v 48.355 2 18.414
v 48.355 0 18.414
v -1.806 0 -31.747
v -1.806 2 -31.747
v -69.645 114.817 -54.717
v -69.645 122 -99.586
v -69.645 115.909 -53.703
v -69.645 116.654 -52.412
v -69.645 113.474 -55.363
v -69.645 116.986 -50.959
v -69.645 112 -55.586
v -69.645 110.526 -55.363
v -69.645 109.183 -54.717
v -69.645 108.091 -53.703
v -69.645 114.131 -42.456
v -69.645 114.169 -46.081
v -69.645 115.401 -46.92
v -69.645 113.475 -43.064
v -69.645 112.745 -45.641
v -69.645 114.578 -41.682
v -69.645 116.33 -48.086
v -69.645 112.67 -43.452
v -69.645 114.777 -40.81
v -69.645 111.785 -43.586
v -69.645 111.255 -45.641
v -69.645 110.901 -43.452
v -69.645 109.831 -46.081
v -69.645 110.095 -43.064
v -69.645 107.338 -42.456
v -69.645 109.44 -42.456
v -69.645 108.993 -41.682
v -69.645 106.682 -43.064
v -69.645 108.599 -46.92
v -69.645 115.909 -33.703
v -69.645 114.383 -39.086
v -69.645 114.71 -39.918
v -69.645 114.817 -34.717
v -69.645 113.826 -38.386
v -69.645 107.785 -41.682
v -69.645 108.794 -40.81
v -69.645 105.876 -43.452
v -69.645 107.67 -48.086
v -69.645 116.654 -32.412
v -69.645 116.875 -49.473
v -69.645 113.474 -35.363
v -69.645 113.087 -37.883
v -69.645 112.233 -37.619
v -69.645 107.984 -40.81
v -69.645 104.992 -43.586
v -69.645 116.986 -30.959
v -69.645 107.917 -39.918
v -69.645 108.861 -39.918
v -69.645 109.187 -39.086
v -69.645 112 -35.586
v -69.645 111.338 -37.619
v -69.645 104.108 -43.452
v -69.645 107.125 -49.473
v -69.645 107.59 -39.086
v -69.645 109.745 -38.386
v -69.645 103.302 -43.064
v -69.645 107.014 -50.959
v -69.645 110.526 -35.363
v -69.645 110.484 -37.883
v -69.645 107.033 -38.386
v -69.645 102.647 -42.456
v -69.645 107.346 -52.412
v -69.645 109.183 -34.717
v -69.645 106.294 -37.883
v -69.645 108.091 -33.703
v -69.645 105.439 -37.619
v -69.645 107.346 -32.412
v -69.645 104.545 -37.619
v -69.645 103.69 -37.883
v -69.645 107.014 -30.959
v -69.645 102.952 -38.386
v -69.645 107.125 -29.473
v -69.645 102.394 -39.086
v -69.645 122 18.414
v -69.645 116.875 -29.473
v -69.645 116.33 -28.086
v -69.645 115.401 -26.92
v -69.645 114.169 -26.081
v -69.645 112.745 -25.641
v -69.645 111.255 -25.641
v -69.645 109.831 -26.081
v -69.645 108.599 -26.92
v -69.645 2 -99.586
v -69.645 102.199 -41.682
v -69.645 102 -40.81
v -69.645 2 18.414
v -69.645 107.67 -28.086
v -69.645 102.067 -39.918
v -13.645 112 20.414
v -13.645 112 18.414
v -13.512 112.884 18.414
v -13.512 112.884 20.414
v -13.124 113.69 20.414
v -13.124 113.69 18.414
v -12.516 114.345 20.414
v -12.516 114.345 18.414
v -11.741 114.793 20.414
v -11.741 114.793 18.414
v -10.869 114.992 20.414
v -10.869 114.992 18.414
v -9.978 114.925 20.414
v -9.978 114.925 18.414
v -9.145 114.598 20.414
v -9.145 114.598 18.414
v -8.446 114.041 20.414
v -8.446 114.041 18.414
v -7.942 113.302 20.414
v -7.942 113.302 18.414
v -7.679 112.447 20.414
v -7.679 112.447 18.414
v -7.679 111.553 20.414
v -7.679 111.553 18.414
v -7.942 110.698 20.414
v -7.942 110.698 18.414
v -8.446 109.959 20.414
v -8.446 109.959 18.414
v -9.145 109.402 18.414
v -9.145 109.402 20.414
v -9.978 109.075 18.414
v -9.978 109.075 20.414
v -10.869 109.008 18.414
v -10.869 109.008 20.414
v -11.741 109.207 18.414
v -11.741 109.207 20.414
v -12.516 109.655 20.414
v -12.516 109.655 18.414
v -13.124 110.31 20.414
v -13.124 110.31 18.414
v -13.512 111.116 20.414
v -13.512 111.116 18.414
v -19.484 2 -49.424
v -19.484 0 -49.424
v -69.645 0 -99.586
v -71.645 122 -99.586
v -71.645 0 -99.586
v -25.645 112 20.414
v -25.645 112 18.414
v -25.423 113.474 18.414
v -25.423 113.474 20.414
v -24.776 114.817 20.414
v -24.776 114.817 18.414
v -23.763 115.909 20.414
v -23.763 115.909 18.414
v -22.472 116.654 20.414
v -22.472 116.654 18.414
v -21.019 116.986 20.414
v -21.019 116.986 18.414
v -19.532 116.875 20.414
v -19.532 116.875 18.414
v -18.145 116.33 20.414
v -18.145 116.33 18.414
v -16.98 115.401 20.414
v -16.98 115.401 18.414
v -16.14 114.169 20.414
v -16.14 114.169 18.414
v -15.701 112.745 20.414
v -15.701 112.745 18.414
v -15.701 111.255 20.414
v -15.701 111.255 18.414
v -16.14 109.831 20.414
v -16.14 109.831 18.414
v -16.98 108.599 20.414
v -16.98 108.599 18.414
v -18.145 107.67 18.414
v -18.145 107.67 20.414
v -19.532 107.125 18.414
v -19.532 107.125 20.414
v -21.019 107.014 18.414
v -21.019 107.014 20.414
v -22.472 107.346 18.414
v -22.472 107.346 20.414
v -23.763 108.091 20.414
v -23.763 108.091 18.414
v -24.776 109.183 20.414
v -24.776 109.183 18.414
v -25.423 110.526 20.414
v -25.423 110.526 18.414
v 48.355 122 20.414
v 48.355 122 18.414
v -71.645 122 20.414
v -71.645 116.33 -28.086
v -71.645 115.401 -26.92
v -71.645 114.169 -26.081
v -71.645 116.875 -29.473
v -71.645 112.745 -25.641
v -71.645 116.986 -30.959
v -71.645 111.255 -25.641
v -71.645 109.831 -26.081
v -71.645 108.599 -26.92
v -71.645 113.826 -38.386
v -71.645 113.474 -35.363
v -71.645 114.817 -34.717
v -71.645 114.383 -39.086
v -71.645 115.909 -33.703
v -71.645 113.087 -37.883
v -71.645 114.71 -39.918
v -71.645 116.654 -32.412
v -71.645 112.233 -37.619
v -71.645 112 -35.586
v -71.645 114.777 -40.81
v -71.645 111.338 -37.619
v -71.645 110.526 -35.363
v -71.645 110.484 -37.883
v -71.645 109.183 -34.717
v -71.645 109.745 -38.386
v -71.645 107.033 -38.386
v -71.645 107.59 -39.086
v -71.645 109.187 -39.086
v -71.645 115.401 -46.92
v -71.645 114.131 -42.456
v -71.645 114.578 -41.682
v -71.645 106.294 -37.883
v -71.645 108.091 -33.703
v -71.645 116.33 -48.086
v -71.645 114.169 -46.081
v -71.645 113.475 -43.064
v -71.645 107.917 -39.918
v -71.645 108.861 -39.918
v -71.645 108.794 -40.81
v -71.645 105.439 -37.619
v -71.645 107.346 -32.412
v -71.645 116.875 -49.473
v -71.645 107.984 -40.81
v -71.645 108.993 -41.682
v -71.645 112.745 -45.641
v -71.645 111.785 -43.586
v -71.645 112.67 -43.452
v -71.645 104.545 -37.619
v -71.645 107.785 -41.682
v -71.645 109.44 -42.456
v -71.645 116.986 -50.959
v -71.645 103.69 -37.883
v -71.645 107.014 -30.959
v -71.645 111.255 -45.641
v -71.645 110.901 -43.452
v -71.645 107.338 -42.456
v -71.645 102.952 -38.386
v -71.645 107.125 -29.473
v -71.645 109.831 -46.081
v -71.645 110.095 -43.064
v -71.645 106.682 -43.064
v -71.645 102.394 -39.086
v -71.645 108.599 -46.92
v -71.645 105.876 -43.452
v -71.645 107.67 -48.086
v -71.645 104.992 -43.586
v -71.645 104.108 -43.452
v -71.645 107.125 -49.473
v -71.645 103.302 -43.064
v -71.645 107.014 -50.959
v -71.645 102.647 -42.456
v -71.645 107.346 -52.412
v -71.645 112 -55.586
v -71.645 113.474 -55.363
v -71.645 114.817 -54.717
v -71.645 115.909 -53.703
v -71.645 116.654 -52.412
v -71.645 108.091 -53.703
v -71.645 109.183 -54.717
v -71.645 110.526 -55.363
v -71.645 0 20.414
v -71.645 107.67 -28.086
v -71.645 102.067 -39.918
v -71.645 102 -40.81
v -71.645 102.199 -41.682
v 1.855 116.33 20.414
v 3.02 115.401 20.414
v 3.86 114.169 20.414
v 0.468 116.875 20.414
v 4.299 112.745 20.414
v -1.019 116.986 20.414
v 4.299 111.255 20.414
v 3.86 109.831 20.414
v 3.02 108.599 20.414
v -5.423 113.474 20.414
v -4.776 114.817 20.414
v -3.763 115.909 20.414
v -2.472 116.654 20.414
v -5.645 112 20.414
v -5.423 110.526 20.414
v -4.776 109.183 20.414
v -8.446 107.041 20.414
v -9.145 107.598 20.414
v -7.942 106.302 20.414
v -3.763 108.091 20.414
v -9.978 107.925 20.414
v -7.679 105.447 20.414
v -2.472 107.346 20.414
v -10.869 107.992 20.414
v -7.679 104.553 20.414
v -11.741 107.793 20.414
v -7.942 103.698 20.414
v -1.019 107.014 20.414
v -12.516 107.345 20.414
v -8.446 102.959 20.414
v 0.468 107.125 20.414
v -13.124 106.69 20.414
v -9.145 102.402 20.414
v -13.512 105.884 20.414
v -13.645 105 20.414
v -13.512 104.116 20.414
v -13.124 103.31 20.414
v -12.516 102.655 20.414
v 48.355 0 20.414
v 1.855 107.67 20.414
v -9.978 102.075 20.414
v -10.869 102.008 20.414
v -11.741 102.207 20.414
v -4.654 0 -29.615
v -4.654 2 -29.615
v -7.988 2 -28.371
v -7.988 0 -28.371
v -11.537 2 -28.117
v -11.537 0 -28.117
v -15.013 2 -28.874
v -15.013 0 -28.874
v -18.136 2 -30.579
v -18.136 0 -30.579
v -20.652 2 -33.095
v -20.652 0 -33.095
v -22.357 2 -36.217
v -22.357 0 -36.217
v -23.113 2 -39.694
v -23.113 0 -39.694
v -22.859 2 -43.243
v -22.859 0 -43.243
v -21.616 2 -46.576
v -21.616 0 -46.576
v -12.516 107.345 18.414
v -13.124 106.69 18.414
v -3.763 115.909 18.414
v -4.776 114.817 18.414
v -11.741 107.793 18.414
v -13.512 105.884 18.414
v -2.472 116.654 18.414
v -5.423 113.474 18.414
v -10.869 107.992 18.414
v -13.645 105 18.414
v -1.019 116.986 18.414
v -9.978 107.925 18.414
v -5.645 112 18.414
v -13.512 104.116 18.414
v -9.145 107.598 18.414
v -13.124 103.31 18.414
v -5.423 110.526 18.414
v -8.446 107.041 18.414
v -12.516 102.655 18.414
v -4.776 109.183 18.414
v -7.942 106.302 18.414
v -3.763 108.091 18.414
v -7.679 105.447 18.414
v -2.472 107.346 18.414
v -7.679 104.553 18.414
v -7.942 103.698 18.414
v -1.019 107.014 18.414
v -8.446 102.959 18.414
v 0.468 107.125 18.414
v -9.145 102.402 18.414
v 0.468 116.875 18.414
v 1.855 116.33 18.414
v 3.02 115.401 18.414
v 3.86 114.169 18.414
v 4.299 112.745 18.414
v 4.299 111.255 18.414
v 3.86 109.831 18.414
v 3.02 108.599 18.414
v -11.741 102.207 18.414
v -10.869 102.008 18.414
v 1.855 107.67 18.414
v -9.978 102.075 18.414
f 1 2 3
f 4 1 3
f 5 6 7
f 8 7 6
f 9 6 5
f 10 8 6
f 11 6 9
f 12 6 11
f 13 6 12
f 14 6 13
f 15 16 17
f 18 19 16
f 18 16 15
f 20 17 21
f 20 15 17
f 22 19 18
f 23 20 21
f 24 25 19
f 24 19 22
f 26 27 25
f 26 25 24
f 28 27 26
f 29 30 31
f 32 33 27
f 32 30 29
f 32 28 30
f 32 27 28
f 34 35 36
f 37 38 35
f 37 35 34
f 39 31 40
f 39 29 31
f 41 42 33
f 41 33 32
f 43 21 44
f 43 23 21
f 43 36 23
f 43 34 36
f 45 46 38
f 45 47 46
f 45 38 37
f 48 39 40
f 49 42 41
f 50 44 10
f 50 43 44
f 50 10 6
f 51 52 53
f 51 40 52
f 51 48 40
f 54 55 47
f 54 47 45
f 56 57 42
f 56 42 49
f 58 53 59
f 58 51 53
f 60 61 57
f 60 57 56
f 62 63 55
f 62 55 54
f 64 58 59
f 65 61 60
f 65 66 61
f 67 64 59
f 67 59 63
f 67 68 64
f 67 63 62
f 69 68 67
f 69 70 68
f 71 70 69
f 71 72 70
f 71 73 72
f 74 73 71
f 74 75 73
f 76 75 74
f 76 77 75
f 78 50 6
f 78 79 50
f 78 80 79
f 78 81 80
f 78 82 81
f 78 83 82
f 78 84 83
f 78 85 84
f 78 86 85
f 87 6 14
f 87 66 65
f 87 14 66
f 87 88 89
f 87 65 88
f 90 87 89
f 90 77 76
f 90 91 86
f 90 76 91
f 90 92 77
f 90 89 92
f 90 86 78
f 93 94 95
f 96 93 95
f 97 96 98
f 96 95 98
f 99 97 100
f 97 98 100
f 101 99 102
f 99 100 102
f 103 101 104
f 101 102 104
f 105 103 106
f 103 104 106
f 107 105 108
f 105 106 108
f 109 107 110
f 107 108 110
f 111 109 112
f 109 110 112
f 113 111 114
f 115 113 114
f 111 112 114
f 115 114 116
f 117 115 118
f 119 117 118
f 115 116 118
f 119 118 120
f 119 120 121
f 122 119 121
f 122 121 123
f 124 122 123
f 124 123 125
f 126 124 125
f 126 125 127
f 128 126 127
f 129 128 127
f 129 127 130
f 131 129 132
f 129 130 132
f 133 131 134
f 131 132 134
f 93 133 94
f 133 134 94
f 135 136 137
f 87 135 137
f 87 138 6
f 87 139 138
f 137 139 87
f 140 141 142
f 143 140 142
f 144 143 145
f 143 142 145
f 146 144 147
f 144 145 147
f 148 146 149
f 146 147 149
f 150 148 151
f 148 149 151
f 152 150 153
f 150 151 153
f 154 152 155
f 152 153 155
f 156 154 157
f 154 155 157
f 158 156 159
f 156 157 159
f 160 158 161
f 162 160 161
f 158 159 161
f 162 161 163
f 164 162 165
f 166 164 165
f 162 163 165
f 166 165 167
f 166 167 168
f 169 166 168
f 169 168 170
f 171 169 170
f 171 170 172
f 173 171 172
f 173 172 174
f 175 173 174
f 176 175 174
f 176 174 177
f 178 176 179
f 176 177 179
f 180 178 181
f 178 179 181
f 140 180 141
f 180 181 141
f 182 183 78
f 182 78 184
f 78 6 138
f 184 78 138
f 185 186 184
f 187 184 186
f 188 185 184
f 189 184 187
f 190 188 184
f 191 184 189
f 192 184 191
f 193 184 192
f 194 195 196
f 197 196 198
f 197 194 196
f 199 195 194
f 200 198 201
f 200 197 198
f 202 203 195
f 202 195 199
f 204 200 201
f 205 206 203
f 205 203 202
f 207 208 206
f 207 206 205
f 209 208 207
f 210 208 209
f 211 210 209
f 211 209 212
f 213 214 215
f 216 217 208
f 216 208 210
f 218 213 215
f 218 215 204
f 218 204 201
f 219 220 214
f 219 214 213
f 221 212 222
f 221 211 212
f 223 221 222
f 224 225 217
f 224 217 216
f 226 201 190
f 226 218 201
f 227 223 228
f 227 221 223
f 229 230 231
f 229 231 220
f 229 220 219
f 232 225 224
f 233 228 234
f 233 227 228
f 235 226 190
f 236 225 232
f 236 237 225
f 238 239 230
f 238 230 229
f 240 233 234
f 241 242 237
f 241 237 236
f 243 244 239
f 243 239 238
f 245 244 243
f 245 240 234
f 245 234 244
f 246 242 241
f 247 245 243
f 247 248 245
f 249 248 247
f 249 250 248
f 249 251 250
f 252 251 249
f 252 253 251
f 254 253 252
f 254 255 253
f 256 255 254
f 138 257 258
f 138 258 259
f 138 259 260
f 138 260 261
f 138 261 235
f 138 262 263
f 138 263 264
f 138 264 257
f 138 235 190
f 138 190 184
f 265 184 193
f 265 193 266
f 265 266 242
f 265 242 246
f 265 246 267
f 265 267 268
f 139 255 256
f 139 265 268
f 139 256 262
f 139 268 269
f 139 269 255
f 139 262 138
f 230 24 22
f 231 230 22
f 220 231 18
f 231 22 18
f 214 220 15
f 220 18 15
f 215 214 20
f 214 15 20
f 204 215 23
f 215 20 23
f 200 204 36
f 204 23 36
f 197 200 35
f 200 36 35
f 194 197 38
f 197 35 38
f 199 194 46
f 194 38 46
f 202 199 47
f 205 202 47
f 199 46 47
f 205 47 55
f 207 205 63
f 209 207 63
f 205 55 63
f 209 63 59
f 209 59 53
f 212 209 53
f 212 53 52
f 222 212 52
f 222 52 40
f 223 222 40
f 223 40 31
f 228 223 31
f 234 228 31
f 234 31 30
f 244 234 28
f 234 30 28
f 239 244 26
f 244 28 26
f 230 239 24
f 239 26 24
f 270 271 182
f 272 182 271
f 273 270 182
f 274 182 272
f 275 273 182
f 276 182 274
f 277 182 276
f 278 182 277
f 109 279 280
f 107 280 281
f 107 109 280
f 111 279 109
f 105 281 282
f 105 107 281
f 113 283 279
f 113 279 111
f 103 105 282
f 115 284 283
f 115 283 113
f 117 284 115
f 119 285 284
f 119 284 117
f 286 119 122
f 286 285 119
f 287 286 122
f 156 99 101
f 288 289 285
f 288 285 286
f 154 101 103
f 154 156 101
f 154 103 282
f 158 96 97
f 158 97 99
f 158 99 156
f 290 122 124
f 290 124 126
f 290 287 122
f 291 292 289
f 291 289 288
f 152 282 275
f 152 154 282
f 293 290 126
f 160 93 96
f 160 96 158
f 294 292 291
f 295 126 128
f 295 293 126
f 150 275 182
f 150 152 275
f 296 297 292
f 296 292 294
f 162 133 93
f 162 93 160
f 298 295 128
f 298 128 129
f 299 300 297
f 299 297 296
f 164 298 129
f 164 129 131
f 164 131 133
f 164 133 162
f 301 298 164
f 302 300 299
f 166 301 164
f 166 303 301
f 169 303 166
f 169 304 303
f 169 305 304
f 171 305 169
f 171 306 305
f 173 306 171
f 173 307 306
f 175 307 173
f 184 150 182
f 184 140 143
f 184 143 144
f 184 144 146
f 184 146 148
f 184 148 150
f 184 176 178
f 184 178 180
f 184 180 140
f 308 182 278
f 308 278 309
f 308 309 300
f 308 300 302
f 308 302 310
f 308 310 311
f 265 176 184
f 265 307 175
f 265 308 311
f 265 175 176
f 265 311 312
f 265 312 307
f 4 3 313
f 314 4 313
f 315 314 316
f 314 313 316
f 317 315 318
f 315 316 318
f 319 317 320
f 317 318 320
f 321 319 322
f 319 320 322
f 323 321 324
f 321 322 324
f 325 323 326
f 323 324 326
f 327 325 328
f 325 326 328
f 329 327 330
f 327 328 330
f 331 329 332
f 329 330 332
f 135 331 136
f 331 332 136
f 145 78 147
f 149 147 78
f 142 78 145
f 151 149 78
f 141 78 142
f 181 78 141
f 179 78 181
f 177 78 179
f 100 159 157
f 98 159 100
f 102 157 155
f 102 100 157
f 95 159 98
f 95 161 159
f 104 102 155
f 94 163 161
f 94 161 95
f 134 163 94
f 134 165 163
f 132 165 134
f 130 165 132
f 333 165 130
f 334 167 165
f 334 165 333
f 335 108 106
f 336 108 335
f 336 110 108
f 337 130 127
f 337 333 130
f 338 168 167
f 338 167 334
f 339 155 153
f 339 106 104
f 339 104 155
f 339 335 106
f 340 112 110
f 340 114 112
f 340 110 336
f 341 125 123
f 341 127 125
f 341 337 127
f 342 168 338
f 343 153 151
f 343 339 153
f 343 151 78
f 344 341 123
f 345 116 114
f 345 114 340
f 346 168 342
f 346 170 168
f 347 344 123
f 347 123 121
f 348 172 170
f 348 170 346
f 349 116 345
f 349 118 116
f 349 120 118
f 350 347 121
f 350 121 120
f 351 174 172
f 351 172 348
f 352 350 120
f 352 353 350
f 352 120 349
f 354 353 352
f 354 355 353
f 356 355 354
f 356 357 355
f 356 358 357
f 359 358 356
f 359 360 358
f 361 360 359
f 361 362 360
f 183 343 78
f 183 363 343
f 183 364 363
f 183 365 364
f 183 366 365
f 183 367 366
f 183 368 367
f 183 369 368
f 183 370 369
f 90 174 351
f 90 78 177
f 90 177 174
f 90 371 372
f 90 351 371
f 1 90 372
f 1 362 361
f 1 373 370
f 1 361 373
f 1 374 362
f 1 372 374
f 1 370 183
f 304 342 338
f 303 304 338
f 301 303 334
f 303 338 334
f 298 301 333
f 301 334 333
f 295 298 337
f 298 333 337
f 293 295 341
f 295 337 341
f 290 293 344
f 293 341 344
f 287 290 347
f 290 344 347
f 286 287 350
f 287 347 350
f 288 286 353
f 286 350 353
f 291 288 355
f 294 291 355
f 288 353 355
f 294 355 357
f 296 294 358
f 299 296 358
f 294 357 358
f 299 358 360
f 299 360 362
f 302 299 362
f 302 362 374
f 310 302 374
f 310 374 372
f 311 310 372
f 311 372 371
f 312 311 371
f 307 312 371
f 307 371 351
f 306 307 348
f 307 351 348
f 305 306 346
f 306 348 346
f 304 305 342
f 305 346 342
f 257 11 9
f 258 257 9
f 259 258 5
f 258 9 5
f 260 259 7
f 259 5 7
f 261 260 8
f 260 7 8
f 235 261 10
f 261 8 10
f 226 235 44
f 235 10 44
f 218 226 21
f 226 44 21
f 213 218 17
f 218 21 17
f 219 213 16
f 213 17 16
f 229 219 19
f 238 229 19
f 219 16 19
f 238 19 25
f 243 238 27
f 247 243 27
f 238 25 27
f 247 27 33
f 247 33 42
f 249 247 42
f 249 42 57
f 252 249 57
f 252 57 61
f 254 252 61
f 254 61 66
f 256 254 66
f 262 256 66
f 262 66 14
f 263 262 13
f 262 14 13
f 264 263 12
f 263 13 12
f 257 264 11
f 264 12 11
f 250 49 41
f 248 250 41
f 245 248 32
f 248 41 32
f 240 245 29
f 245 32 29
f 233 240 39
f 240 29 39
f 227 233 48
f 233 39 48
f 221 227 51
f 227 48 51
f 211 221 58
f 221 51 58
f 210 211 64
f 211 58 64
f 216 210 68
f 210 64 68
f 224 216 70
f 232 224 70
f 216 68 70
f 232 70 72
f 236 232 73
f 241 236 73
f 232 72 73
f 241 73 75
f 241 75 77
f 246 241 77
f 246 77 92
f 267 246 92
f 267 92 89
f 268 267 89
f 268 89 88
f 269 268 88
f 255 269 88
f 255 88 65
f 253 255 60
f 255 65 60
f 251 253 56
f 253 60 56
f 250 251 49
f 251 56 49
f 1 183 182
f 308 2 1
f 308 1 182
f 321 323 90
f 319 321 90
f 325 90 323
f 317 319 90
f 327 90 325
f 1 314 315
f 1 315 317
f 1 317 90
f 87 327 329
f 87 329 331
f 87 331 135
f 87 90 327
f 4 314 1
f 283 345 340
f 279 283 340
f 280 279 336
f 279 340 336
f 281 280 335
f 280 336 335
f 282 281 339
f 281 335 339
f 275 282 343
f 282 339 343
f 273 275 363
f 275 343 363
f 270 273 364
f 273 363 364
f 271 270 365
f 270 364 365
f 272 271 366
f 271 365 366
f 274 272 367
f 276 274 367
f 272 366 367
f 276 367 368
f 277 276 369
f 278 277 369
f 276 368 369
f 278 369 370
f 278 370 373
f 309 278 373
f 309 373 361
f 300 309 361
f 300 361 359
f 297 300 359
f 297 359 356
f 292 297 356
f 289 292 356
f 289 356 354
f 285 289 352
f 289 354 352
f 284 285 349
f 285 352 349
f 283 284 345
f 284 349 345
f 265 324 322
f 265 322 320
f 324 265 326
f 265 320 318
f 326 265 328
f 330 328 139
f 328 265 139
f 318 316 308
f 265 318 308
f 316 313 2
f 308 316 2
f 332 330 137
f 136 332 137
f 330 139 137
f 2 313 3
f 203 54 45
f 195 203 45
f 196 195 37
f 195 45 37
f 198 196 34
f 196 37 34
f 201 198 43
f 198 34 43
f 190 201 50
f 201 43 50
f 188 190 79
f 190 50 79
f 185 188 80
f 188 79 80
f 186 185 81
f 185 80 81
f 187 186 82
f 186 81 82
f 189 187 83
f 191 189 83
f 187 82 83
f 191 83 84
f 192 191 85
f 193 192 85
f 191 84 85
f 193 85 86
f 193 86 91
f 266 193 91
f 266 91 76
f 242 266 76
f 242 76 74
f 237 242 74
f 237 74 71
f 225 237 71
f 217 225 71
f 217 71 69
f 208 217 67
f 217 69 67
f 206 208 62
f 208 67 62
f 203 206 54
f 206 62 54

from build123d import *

# Parameters (mm, degrees)
EXTRUDE_1_DEPTH     = 2
EXTRUDE_2_DEPTH     = 120
SKETCH_3_R          = 5
SKETCH_3_R_2        = 3
CUT_EXTRUDE_1_DEPTH = 2
SKETCH_4_R          = 5
SKETCH_4_R_2        = 3
CUT_EXTRUDE_2_DEPTH = 2
SKETCH_5_R          = 3
CUT_EXTRUDE_3_DEPTH = 2


with BuildPart() as part:
    # 草图1 → 凸台-拉伸1 (new body)
    with BuildSketch(Plane(origin=(0, 0, 0), x_dir=(1, 0, 0), z_dir=(0, 1, 0))):
        with BuildLine():
            Line((-71.645096328, 99.585522078), (-71.645096328, -20.414477922))
            Line((-71.645096328, -20.414477922), (48.354903672, -20.414477922))
            Line((48.354903672, -20.414477922), (48.354903672, -18.414477922))
            Line((48.354903672, -18.414477922), (-1.806261563, 31.746687313))
            ThreePointArc((-1.806261563, 31.746687313), (-19.483931092, 31.746687313), (-19.483931092, 49.424356842))
            Line((-19.483931092, 49.424356842), (-69.645096328, 99.585522078))
            Line((-69.645096328, 99.585522078), (-71.645096328, 99.585522078))
        make_face()
    extrude(amount=EXTRUDE_1_DEPTH)

    # 草图2 → 凸台-拉伸2 (add)
    with BuildSketch(Plane(origin=(0, 2, 0), x_dir=(1, 0, 0), z_dir=(0, 1, 0))):
        Polygon((-69.645096328, 99.585522078), (-69.645096328, -18.414477922), (48.354903672, -18.414477922), (48.354903672, -20.414477922), (-71.645096328, -20.414477922), (-71.645096328, 99.585522078), align=None)
    extrude(amount=EXTRUDE_2_DEPTH)

    # 草图3 → 切除-拉伸1 (cut)
    with BuildSketch(Plane(origin=(0, 0, 18.414477922), x_dir=(-1, 0, 0), z_dir=(0, 0, -1))):
        with Locations((0.645096328, 112)):
            Circle(SKETCH_3_R)
        with Locations((20.645096328, 112)):
            Circle(SKETCH_3_R)
        with Locations((10.645096328, 112)):
            Circle(SKETCH_3_R_2)
    extrude(amount=-CUT_EXTRUDE_1_DEPTH, mode=Mode.SUBTRACT)

    # 草图4 → 切除-拉伸2 (cut)
    with BuildSketch(Plane(origin=(-69.645096328, 0, 0), x_dir=(0, 0, -1), z_dir=(1, 0, 0))):
        with Locations((30.585522078, 112)):
            Circle(SKETCH_4_R)
        with Locations((50.585522078, 112)):
            Circle(SKETCH_4_R)
        with Locations((40.585522078, 111.785381459)):
            Circle(SKETCH_4_R_2)
        with Locations((40.585522078, 104.992052501)):
            Circle(SKETCH_4_R_2)
    extrude(amount=-CUT_EXTRUDE_2_DEPTH, mode=Mode.SUBTRACT)

    # 草图5 → 切除-拉伸3 (cut)
    with BuildSketch(Plane(origin=(0, 0, 18.414477922), x_dir=(-1, 0, 0), z_dir=(0, 0, -1))):
        with Locations((10.645096328, 105)):
            Circle(SKETCH_5_R)
    extrude(amount=-CUT_EXTRUDE_3_DEPTH, mode=Mode.SUBTRACT)


solid = part.part
